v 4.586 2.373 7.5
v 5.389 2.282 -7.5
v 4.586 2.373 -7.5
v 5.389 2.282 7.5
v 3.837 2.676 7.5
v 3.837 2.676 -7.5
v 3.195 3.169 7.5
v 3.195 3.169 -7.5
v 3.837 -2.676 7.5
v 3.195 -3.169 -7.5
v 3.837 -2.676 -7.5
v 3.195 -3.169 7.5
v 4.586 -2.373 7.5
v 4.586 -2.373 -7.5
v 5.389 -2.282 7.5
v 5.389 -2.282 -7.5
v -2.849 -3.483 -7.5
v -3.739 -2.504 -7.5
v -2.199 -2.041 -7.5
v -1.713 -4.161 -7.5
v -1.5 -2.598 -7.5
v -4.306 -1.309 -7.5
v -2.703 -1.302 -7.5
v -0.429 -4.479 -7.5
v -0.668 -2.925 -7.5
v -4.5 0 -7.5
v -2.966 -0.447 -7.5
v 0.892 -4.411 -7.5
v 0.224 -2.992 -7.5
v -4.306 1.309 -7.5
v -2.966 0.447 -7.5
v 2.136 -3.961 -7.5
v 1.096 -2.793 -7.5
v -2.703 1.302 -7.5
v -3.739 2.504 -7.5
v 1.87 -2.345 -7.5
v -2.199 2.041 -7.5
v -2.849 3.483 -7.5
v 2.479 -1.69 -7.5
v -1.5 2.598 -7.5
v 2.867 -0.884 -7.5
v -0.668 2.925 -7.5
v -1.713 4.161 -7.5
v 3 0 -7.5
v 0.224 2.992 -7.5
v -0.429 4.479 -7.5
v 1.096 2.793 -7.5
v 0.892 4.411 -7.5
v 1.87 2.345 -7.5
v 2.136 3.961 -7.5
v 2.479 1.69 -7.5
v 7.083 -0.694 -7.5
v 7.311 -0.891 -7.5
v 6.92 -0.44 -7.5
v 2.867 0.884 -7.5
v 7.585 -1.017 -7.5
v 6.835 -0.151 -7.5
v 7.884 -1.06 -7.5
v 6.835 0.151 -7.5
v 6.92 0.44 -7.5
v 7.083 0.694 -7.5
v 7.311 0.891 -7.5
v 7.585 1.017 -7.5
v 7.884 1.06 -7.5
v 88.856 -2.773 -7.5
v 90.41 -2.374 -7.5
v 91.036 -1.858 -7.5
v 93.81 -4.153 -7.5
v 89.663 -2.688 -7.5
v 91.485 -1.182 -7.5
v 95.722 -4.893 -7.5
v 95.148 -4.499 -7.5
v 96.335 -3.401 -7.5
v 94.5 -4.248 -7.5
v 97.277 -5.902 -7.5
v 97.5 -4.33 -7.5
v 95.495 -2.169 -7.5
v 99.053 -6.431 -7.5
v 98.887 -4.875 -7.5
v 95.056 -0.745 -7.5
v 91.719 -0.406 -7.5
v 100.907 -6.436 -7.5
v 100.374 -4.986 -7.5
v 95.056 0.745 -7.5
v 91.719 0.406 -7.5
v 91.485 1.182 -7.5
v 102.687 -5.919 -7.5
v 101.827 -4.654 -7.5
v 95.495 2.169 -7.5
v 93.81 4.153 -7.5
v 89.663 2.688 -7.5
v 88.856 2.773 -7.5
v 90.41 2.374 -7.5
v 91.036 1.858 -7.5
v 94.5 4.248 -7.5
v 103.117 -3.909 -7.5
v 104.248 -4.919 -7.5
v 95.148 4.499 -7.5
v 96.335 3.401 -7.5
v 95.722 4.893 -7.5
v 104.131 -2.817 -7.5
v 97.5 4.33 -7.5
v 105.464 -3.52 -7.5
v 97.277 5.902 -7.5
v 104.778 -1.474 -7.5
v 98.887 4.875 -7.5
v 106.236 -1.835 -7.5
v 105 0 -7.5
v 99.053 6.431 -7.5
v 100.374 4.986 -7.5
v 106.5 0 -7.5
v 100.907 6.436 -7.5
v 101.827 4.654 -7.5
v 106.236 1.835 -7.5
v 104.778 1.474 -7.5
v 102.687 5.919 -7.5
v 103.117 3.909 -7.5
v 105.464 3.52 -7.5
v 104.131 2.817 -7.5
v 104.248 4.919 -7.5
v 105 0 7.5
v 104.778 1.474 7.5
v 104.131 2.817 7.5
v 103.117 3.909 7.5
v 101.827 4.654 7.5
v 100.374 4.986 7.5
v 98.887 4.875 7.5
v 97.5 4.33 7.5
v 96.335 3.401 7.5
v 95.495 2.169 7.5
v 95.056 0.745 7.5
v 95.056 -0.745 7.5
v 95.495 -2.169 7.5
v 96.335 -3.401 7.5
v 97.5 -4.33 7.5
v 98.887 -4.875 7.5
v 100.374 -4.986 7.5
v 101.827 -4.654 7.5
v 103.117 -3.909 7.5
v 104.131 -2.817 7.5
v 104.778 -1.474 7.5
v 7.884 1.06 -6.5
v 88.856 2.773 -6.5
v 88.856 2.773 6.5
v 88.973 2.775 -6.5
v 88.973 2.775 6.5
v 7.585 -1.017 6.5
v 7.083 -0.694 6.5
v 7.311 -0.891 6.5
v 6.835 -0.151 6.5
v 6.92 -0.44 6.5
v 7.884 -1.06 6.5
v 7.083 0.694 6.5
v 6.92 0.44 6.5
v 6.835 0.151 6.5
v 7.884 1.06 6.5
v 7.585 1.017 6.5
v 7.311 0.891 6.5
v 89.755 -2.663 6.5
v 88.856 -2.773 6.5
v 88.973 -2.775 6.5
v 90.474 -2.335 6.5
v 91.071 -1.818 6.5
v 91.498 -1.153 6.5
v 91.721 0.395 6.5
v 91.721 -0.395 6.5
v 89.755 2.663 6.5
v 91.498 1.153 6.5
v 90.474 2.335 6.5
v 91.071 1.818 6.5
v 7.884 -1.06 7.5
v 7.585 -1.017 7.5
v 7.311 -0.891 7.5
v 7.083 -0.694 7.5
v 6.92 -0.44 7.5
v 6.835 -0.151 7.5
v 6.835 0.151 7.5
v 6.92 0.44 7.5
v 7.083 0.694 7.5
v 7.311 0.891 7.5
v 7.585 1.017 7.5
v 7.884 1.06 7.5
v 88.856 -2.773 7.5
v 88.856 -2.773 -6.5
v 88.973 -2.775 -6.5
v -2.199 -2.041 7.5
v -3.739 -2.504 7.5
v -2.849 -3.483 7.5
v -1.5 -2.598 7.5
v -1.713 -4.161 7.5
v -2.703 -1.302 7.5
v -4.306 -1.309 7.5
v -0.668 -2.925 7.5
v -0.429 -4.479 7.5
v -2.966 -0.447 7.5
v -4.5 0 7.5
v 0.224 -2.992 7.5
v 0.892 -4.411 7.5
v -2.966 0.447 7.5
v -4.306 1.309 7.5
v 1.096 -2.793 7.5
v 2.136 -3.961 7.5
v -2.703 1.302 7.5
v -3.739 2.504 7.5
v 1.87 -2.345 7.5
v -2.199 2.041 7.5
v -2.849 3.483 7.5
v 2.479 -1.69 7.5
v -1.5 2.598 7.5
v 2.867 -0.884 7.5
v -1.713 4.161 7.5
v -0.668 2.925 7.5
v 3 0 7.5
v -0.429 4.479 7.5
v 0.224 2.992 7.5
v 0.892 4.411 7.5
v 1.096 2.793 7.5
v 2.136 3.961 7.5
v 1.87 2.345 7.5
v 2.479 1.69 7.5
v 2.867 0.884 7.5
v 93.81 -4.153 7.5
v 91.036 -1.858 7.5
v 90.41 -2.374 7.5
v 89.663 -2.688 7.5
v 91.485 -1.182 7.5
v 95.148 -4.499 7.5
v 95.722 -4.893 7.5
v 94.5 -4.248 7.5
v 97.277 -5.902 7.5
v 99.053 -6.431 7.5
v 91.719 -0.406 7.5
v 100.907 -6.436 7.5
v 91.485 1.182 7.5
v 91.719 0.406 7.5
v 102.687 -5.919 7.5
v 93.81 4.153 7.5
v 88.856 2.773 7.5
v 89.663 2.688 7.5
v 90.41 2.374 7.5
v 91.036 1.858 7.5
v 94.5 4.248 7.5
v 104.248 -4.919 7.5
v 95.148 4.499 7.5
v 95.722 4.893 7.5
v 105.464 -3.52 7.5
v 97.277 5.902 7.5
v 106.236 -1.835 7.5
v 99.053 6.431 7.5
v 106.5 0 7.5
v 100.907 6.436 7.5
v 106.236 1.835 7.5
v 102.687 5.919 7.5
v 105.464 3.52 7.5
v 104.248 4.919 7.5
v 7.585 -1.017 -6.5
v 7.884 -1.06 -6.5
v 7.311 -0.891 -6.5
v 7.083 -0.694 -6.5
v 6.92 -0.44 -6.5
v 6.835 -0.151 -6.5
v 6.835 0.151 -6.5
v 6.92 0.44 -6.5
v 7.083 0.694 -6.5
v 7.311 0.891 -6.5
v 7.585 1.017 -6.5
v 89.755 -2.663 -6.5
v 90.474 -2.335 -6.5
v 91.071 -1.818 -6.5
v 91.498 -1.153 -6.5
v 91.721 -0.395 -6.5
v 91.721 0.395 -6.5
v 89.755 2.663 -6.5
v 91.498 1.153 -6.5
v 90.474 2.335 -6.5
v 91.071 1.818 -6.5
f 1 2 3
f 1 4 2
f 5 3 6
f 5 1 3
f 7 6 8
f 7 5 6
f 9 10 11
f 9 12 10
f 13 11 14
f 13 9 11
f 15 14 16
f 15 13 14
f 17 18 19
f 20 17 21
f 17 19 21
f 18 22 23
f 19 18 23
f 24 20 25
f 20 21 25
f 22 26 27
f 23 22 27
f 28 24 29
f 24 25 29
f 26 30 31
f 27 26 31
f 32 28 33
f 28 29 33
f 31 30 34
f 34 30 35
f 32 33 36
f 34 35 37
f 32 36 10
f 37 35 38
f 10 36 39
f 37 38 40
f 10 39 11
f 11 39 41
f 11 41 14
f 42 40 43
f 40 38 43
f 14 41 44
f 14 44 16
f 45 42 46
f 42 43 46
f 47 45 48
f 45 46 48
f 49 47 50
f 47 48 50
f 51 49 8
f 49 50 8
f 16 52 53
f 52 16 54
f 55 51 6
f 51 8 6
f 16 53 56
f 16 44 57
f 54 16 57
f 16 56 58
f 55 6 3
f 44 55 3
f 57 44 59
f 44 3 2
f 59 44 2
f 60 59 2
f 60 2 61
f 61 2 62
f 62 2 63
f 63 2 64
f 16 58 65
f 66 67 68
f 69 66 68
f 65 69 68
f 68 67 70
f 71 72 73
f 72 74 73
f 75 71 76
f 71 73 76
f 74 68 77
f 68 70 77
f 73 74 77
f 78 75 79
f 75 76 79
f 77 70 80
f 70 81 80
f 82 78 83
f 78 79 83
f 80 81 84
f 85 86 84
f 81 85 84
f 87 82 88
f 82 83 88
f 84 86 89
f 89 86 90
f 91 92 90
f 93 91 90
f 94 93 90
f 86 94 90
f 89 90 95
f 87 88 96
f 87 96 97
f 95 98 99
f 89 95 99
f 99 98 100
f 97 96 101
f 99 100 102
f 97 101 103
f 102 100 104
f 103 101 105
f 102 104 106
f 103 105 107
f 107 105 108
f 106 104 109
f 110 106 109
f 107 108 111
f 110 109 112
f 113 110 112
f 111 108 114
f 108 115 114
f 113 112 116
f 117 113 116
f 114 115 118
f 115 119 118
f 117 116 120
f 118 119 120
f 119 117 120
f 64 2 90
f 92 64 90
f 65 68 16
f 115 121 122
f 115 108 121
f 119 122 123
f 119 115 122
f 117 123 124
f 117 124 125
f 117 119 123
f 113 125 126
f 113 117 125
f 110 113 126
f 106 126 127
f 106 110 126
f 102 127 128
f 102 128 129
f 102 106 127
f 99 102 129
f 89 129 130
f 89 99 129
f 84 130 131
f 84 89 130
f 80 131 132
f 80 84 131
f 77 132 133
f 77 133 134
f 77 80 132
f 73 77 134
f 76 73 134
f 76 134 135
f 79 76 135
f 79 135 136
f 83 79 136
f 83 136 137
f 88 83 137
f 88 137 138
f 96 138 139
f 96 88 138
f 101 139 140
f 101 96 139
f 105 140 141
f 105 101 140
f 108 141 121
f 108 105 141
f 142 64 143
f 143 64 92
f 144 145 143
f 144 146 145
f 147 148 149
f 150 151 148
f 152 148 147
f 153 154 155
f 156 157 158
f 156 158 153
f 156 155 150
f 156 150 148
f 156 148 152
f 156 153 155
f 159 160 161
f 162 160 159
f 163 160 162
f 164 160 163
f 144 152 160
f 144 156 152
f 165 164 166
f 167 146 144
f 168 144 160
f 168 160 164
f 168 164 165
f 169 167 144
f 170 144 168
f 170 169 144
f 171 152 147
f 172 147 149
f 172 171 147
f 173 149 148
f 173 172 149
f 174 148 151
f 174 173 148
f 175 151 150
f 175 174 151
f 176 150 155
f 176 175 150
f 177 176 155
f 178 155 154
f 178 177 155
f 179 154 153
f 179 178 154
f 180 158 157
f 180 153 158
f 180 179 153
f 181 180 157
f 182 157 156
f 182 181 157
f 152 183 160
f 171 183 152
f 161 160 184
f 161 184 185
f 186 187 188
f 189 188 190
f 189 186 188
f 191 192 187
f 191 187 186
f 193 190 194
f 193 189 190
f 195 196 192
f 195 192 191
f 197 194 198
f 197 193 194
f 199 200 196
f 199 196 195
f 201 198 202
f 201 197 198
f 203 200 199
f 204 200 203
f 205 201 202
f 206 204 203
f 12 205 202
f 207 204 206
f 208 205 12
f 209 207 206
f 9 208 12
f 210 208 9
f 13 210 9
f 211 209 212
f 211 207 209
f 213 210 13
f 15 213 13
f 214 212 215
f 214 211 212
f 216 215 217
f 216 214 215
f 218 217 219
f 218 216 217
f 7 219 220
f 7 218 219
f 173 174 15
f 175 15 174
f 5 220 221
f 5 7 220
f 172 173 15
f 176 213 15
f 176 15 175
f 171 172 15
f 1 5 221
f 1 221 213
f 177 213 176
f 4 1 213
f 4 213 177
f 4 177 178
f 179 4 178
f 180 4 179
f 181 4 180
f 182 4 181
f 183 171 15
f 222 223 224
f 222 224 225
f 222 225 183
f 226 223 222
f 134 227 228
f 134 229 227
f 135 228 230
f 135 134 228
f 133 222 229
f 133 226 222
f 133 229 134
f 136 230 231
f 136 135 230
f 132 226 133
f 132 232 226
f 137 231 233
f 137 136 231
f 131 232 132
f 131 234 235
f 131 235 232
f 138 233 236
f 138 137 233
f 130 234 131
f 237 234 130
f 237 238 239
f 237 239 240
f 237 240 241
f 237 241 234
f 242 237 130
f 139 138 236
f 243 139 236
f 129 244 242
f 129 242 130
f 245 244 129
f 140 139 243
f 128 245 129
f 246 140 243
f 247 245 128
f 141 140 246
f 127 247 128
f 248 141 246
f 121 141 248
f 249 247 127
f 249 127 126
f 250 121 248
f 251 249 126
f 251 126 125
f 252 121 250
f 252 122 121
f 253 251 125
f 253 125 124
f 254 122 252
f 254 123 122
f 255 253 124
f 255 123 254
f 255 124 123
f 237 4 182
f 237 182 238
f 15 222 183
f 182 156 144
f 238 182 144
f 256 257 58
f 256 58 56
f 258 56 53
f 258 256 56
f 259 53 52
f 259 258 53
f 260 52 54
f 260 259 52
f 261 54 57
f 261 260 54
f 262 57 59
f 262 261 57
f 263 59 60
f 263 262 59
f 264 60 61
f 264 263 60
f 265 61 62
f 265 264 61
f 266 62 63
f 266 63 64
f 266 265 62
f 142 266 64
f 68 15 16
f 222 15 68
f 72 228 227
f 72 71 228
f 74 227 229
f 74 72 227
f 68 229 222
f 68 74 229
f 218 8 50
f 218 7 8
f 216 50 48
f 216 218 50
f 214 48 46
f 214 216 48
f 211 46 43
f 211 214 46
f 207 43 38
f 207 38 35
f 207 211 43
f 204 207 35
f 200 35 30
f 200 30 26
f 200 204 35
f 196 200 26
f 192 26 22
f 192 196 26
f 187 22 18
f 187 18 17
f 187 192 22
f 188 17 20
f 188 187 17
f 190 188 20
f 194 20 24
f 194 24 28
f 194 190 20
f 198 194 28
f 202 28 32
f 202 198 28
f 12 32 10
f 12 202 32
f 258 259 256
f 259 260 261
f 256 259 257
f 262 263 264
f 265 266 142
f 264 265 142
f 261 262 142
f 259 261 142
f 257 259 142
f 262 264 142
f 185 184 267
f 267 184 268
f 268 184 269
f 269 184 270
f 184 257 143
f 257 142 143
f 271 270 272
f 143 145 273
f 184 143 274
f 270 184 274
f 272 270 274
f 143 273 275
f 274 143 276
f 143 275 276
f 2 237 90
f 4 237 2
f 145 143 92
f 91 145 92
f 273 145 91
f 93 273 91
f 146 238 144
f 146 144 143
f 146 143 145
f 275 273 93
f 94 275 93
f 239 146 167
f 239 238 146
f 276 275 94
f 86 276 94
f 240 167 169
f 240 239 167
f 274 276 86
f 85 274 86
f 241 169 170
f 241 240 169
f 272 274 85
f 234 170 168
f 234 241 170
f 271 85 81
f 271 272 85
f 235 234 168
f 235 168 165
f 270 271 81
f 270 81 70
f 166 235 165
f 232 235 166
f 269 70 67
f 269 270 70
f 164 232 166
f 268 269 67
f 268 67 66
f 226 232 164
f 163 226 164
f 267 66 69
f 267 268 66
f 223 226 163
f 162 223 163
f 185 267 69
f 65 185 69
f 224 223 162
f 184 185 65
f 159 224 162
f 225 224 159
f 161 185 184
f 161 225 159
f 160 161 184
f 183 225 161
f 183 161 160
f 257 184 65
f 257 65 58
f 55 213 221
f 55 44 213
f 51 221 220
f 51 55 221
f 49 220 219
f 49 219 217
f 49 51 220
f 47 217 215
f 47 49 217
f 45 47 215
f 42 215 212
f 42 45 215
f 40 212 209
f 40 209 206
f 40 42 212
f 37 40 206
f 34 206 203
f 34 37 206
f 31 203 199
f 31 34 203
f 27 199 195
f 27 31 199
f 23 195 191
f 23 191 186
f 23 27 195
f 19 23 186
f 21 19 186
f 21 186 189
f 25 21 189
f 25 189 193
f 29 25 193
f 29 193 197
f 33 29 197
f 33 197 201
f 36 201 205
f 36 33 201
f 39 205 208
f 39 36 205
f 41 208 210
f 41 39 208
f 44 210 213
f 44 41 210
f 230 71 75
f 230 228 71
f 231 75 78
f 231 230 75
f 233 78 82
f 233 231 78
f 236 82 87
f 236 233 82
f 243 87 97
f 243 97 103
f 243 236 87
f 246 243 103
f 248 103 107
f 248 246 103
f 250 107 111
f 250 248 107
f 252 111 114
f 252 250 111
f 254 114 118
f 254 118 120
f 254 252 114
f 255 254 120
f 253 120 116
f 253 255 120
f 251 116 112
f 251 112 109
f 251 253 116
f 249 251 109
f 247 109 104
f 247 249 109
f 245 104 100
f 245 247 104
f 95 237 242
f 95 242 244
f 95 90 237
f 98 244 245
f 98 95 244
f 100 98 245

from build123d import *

# Parameters (mm, degrees)
SKETCH1_R           = 5
SKETCH1_R_2         = 3
BOSS_EXTRUDE2_DEPTH = 7.5
BOSS_EXTRUDE3_DEPTH = 6.5
FILLET1_R           = 3


with BuildPart() as part:
    # Sketch1 → Boss-Extrude2 (new, symmetric)
    with BuildSketch(Plane.XY):
        with BuildLine():
            Line((95.02071112, 4.178119463), (3.897114317, 2.25))
            ThreePointArc((3.897114317, 2.25), (-4.5, 0), (3.897114317, -2.25))
            Line((3.897114317, -2.25), (95.02071112, -4.178119463))
            ThreePointArc((95.02071112, -4.178119463), (106.5, 0), (95.02071112, 4.178119463))
        make_face()
        with BuildLine():
            ThreePointArc((7.883680433, -1.059645666), (6.824034767, 0), (7.883680433, 1.059645666))
            Line((7.883680433, 1.059645666), (88.855952705, 2.772969323))
            ThreePointArc((88.855952705, 2.772969323), (91.748807392, 0), (88.855952705, -2.772969323))
            Line((88.855952705, -2.772969323), (7.883680433, -1.059645666))
        make_face(mode=Mode.SUBTRACT)
        with Locations((100, 0)):
            Circle(SKETCH1_R, mode=Mode.SUBTRACT)
        Circle(SKETCH1_R_2, mode=Mode.SUBTRACT)
    extrude(amount=BOSS_EXTRUDE2_DEPTH, both=True)

    # Sketch1<7> → Boss-Extrude3 (add, symmetric)
    with BuildSketch(Plane.XY):
        with BuildLine():
            Line((88.855952705, 2.772969323), (7.883680433, 1.059645666))
            ThreePointArc((7.883680433, 1.059645666), (6.824034767, 0), (7.883680433, -1.059645666))
            Line((7.883680433, -1.059645666), (88.855952705, -2.772969323))
            Line((88.855952705, -2.772969323), (88.973353931, -2.775453461))
            ThreePointArc((88.973353931, -2.775453461), (91.748807392, 0), (88.973353931, 2.775453461))
            Line((88.973353931, 2.775453461), (88.855952705, 2.772969323))
        make_face()
    extrude(amount=BOSS_EXTRUDE3_DEPTH, both=True)

    # Fillet1
    fillet1_edges = [part.edges().sort_by_distance(p)[0] for p in [
        (95.02071112, -4.178119463, 0),
        (3.897114317, -2.25, 0),
        (3.897114317, 2.25, 0),
        (95.02071112, 4.178119463, 0),
    ]]
    fillet(fillet1_edges, radius=FILLET1_R)


solid = part.part
